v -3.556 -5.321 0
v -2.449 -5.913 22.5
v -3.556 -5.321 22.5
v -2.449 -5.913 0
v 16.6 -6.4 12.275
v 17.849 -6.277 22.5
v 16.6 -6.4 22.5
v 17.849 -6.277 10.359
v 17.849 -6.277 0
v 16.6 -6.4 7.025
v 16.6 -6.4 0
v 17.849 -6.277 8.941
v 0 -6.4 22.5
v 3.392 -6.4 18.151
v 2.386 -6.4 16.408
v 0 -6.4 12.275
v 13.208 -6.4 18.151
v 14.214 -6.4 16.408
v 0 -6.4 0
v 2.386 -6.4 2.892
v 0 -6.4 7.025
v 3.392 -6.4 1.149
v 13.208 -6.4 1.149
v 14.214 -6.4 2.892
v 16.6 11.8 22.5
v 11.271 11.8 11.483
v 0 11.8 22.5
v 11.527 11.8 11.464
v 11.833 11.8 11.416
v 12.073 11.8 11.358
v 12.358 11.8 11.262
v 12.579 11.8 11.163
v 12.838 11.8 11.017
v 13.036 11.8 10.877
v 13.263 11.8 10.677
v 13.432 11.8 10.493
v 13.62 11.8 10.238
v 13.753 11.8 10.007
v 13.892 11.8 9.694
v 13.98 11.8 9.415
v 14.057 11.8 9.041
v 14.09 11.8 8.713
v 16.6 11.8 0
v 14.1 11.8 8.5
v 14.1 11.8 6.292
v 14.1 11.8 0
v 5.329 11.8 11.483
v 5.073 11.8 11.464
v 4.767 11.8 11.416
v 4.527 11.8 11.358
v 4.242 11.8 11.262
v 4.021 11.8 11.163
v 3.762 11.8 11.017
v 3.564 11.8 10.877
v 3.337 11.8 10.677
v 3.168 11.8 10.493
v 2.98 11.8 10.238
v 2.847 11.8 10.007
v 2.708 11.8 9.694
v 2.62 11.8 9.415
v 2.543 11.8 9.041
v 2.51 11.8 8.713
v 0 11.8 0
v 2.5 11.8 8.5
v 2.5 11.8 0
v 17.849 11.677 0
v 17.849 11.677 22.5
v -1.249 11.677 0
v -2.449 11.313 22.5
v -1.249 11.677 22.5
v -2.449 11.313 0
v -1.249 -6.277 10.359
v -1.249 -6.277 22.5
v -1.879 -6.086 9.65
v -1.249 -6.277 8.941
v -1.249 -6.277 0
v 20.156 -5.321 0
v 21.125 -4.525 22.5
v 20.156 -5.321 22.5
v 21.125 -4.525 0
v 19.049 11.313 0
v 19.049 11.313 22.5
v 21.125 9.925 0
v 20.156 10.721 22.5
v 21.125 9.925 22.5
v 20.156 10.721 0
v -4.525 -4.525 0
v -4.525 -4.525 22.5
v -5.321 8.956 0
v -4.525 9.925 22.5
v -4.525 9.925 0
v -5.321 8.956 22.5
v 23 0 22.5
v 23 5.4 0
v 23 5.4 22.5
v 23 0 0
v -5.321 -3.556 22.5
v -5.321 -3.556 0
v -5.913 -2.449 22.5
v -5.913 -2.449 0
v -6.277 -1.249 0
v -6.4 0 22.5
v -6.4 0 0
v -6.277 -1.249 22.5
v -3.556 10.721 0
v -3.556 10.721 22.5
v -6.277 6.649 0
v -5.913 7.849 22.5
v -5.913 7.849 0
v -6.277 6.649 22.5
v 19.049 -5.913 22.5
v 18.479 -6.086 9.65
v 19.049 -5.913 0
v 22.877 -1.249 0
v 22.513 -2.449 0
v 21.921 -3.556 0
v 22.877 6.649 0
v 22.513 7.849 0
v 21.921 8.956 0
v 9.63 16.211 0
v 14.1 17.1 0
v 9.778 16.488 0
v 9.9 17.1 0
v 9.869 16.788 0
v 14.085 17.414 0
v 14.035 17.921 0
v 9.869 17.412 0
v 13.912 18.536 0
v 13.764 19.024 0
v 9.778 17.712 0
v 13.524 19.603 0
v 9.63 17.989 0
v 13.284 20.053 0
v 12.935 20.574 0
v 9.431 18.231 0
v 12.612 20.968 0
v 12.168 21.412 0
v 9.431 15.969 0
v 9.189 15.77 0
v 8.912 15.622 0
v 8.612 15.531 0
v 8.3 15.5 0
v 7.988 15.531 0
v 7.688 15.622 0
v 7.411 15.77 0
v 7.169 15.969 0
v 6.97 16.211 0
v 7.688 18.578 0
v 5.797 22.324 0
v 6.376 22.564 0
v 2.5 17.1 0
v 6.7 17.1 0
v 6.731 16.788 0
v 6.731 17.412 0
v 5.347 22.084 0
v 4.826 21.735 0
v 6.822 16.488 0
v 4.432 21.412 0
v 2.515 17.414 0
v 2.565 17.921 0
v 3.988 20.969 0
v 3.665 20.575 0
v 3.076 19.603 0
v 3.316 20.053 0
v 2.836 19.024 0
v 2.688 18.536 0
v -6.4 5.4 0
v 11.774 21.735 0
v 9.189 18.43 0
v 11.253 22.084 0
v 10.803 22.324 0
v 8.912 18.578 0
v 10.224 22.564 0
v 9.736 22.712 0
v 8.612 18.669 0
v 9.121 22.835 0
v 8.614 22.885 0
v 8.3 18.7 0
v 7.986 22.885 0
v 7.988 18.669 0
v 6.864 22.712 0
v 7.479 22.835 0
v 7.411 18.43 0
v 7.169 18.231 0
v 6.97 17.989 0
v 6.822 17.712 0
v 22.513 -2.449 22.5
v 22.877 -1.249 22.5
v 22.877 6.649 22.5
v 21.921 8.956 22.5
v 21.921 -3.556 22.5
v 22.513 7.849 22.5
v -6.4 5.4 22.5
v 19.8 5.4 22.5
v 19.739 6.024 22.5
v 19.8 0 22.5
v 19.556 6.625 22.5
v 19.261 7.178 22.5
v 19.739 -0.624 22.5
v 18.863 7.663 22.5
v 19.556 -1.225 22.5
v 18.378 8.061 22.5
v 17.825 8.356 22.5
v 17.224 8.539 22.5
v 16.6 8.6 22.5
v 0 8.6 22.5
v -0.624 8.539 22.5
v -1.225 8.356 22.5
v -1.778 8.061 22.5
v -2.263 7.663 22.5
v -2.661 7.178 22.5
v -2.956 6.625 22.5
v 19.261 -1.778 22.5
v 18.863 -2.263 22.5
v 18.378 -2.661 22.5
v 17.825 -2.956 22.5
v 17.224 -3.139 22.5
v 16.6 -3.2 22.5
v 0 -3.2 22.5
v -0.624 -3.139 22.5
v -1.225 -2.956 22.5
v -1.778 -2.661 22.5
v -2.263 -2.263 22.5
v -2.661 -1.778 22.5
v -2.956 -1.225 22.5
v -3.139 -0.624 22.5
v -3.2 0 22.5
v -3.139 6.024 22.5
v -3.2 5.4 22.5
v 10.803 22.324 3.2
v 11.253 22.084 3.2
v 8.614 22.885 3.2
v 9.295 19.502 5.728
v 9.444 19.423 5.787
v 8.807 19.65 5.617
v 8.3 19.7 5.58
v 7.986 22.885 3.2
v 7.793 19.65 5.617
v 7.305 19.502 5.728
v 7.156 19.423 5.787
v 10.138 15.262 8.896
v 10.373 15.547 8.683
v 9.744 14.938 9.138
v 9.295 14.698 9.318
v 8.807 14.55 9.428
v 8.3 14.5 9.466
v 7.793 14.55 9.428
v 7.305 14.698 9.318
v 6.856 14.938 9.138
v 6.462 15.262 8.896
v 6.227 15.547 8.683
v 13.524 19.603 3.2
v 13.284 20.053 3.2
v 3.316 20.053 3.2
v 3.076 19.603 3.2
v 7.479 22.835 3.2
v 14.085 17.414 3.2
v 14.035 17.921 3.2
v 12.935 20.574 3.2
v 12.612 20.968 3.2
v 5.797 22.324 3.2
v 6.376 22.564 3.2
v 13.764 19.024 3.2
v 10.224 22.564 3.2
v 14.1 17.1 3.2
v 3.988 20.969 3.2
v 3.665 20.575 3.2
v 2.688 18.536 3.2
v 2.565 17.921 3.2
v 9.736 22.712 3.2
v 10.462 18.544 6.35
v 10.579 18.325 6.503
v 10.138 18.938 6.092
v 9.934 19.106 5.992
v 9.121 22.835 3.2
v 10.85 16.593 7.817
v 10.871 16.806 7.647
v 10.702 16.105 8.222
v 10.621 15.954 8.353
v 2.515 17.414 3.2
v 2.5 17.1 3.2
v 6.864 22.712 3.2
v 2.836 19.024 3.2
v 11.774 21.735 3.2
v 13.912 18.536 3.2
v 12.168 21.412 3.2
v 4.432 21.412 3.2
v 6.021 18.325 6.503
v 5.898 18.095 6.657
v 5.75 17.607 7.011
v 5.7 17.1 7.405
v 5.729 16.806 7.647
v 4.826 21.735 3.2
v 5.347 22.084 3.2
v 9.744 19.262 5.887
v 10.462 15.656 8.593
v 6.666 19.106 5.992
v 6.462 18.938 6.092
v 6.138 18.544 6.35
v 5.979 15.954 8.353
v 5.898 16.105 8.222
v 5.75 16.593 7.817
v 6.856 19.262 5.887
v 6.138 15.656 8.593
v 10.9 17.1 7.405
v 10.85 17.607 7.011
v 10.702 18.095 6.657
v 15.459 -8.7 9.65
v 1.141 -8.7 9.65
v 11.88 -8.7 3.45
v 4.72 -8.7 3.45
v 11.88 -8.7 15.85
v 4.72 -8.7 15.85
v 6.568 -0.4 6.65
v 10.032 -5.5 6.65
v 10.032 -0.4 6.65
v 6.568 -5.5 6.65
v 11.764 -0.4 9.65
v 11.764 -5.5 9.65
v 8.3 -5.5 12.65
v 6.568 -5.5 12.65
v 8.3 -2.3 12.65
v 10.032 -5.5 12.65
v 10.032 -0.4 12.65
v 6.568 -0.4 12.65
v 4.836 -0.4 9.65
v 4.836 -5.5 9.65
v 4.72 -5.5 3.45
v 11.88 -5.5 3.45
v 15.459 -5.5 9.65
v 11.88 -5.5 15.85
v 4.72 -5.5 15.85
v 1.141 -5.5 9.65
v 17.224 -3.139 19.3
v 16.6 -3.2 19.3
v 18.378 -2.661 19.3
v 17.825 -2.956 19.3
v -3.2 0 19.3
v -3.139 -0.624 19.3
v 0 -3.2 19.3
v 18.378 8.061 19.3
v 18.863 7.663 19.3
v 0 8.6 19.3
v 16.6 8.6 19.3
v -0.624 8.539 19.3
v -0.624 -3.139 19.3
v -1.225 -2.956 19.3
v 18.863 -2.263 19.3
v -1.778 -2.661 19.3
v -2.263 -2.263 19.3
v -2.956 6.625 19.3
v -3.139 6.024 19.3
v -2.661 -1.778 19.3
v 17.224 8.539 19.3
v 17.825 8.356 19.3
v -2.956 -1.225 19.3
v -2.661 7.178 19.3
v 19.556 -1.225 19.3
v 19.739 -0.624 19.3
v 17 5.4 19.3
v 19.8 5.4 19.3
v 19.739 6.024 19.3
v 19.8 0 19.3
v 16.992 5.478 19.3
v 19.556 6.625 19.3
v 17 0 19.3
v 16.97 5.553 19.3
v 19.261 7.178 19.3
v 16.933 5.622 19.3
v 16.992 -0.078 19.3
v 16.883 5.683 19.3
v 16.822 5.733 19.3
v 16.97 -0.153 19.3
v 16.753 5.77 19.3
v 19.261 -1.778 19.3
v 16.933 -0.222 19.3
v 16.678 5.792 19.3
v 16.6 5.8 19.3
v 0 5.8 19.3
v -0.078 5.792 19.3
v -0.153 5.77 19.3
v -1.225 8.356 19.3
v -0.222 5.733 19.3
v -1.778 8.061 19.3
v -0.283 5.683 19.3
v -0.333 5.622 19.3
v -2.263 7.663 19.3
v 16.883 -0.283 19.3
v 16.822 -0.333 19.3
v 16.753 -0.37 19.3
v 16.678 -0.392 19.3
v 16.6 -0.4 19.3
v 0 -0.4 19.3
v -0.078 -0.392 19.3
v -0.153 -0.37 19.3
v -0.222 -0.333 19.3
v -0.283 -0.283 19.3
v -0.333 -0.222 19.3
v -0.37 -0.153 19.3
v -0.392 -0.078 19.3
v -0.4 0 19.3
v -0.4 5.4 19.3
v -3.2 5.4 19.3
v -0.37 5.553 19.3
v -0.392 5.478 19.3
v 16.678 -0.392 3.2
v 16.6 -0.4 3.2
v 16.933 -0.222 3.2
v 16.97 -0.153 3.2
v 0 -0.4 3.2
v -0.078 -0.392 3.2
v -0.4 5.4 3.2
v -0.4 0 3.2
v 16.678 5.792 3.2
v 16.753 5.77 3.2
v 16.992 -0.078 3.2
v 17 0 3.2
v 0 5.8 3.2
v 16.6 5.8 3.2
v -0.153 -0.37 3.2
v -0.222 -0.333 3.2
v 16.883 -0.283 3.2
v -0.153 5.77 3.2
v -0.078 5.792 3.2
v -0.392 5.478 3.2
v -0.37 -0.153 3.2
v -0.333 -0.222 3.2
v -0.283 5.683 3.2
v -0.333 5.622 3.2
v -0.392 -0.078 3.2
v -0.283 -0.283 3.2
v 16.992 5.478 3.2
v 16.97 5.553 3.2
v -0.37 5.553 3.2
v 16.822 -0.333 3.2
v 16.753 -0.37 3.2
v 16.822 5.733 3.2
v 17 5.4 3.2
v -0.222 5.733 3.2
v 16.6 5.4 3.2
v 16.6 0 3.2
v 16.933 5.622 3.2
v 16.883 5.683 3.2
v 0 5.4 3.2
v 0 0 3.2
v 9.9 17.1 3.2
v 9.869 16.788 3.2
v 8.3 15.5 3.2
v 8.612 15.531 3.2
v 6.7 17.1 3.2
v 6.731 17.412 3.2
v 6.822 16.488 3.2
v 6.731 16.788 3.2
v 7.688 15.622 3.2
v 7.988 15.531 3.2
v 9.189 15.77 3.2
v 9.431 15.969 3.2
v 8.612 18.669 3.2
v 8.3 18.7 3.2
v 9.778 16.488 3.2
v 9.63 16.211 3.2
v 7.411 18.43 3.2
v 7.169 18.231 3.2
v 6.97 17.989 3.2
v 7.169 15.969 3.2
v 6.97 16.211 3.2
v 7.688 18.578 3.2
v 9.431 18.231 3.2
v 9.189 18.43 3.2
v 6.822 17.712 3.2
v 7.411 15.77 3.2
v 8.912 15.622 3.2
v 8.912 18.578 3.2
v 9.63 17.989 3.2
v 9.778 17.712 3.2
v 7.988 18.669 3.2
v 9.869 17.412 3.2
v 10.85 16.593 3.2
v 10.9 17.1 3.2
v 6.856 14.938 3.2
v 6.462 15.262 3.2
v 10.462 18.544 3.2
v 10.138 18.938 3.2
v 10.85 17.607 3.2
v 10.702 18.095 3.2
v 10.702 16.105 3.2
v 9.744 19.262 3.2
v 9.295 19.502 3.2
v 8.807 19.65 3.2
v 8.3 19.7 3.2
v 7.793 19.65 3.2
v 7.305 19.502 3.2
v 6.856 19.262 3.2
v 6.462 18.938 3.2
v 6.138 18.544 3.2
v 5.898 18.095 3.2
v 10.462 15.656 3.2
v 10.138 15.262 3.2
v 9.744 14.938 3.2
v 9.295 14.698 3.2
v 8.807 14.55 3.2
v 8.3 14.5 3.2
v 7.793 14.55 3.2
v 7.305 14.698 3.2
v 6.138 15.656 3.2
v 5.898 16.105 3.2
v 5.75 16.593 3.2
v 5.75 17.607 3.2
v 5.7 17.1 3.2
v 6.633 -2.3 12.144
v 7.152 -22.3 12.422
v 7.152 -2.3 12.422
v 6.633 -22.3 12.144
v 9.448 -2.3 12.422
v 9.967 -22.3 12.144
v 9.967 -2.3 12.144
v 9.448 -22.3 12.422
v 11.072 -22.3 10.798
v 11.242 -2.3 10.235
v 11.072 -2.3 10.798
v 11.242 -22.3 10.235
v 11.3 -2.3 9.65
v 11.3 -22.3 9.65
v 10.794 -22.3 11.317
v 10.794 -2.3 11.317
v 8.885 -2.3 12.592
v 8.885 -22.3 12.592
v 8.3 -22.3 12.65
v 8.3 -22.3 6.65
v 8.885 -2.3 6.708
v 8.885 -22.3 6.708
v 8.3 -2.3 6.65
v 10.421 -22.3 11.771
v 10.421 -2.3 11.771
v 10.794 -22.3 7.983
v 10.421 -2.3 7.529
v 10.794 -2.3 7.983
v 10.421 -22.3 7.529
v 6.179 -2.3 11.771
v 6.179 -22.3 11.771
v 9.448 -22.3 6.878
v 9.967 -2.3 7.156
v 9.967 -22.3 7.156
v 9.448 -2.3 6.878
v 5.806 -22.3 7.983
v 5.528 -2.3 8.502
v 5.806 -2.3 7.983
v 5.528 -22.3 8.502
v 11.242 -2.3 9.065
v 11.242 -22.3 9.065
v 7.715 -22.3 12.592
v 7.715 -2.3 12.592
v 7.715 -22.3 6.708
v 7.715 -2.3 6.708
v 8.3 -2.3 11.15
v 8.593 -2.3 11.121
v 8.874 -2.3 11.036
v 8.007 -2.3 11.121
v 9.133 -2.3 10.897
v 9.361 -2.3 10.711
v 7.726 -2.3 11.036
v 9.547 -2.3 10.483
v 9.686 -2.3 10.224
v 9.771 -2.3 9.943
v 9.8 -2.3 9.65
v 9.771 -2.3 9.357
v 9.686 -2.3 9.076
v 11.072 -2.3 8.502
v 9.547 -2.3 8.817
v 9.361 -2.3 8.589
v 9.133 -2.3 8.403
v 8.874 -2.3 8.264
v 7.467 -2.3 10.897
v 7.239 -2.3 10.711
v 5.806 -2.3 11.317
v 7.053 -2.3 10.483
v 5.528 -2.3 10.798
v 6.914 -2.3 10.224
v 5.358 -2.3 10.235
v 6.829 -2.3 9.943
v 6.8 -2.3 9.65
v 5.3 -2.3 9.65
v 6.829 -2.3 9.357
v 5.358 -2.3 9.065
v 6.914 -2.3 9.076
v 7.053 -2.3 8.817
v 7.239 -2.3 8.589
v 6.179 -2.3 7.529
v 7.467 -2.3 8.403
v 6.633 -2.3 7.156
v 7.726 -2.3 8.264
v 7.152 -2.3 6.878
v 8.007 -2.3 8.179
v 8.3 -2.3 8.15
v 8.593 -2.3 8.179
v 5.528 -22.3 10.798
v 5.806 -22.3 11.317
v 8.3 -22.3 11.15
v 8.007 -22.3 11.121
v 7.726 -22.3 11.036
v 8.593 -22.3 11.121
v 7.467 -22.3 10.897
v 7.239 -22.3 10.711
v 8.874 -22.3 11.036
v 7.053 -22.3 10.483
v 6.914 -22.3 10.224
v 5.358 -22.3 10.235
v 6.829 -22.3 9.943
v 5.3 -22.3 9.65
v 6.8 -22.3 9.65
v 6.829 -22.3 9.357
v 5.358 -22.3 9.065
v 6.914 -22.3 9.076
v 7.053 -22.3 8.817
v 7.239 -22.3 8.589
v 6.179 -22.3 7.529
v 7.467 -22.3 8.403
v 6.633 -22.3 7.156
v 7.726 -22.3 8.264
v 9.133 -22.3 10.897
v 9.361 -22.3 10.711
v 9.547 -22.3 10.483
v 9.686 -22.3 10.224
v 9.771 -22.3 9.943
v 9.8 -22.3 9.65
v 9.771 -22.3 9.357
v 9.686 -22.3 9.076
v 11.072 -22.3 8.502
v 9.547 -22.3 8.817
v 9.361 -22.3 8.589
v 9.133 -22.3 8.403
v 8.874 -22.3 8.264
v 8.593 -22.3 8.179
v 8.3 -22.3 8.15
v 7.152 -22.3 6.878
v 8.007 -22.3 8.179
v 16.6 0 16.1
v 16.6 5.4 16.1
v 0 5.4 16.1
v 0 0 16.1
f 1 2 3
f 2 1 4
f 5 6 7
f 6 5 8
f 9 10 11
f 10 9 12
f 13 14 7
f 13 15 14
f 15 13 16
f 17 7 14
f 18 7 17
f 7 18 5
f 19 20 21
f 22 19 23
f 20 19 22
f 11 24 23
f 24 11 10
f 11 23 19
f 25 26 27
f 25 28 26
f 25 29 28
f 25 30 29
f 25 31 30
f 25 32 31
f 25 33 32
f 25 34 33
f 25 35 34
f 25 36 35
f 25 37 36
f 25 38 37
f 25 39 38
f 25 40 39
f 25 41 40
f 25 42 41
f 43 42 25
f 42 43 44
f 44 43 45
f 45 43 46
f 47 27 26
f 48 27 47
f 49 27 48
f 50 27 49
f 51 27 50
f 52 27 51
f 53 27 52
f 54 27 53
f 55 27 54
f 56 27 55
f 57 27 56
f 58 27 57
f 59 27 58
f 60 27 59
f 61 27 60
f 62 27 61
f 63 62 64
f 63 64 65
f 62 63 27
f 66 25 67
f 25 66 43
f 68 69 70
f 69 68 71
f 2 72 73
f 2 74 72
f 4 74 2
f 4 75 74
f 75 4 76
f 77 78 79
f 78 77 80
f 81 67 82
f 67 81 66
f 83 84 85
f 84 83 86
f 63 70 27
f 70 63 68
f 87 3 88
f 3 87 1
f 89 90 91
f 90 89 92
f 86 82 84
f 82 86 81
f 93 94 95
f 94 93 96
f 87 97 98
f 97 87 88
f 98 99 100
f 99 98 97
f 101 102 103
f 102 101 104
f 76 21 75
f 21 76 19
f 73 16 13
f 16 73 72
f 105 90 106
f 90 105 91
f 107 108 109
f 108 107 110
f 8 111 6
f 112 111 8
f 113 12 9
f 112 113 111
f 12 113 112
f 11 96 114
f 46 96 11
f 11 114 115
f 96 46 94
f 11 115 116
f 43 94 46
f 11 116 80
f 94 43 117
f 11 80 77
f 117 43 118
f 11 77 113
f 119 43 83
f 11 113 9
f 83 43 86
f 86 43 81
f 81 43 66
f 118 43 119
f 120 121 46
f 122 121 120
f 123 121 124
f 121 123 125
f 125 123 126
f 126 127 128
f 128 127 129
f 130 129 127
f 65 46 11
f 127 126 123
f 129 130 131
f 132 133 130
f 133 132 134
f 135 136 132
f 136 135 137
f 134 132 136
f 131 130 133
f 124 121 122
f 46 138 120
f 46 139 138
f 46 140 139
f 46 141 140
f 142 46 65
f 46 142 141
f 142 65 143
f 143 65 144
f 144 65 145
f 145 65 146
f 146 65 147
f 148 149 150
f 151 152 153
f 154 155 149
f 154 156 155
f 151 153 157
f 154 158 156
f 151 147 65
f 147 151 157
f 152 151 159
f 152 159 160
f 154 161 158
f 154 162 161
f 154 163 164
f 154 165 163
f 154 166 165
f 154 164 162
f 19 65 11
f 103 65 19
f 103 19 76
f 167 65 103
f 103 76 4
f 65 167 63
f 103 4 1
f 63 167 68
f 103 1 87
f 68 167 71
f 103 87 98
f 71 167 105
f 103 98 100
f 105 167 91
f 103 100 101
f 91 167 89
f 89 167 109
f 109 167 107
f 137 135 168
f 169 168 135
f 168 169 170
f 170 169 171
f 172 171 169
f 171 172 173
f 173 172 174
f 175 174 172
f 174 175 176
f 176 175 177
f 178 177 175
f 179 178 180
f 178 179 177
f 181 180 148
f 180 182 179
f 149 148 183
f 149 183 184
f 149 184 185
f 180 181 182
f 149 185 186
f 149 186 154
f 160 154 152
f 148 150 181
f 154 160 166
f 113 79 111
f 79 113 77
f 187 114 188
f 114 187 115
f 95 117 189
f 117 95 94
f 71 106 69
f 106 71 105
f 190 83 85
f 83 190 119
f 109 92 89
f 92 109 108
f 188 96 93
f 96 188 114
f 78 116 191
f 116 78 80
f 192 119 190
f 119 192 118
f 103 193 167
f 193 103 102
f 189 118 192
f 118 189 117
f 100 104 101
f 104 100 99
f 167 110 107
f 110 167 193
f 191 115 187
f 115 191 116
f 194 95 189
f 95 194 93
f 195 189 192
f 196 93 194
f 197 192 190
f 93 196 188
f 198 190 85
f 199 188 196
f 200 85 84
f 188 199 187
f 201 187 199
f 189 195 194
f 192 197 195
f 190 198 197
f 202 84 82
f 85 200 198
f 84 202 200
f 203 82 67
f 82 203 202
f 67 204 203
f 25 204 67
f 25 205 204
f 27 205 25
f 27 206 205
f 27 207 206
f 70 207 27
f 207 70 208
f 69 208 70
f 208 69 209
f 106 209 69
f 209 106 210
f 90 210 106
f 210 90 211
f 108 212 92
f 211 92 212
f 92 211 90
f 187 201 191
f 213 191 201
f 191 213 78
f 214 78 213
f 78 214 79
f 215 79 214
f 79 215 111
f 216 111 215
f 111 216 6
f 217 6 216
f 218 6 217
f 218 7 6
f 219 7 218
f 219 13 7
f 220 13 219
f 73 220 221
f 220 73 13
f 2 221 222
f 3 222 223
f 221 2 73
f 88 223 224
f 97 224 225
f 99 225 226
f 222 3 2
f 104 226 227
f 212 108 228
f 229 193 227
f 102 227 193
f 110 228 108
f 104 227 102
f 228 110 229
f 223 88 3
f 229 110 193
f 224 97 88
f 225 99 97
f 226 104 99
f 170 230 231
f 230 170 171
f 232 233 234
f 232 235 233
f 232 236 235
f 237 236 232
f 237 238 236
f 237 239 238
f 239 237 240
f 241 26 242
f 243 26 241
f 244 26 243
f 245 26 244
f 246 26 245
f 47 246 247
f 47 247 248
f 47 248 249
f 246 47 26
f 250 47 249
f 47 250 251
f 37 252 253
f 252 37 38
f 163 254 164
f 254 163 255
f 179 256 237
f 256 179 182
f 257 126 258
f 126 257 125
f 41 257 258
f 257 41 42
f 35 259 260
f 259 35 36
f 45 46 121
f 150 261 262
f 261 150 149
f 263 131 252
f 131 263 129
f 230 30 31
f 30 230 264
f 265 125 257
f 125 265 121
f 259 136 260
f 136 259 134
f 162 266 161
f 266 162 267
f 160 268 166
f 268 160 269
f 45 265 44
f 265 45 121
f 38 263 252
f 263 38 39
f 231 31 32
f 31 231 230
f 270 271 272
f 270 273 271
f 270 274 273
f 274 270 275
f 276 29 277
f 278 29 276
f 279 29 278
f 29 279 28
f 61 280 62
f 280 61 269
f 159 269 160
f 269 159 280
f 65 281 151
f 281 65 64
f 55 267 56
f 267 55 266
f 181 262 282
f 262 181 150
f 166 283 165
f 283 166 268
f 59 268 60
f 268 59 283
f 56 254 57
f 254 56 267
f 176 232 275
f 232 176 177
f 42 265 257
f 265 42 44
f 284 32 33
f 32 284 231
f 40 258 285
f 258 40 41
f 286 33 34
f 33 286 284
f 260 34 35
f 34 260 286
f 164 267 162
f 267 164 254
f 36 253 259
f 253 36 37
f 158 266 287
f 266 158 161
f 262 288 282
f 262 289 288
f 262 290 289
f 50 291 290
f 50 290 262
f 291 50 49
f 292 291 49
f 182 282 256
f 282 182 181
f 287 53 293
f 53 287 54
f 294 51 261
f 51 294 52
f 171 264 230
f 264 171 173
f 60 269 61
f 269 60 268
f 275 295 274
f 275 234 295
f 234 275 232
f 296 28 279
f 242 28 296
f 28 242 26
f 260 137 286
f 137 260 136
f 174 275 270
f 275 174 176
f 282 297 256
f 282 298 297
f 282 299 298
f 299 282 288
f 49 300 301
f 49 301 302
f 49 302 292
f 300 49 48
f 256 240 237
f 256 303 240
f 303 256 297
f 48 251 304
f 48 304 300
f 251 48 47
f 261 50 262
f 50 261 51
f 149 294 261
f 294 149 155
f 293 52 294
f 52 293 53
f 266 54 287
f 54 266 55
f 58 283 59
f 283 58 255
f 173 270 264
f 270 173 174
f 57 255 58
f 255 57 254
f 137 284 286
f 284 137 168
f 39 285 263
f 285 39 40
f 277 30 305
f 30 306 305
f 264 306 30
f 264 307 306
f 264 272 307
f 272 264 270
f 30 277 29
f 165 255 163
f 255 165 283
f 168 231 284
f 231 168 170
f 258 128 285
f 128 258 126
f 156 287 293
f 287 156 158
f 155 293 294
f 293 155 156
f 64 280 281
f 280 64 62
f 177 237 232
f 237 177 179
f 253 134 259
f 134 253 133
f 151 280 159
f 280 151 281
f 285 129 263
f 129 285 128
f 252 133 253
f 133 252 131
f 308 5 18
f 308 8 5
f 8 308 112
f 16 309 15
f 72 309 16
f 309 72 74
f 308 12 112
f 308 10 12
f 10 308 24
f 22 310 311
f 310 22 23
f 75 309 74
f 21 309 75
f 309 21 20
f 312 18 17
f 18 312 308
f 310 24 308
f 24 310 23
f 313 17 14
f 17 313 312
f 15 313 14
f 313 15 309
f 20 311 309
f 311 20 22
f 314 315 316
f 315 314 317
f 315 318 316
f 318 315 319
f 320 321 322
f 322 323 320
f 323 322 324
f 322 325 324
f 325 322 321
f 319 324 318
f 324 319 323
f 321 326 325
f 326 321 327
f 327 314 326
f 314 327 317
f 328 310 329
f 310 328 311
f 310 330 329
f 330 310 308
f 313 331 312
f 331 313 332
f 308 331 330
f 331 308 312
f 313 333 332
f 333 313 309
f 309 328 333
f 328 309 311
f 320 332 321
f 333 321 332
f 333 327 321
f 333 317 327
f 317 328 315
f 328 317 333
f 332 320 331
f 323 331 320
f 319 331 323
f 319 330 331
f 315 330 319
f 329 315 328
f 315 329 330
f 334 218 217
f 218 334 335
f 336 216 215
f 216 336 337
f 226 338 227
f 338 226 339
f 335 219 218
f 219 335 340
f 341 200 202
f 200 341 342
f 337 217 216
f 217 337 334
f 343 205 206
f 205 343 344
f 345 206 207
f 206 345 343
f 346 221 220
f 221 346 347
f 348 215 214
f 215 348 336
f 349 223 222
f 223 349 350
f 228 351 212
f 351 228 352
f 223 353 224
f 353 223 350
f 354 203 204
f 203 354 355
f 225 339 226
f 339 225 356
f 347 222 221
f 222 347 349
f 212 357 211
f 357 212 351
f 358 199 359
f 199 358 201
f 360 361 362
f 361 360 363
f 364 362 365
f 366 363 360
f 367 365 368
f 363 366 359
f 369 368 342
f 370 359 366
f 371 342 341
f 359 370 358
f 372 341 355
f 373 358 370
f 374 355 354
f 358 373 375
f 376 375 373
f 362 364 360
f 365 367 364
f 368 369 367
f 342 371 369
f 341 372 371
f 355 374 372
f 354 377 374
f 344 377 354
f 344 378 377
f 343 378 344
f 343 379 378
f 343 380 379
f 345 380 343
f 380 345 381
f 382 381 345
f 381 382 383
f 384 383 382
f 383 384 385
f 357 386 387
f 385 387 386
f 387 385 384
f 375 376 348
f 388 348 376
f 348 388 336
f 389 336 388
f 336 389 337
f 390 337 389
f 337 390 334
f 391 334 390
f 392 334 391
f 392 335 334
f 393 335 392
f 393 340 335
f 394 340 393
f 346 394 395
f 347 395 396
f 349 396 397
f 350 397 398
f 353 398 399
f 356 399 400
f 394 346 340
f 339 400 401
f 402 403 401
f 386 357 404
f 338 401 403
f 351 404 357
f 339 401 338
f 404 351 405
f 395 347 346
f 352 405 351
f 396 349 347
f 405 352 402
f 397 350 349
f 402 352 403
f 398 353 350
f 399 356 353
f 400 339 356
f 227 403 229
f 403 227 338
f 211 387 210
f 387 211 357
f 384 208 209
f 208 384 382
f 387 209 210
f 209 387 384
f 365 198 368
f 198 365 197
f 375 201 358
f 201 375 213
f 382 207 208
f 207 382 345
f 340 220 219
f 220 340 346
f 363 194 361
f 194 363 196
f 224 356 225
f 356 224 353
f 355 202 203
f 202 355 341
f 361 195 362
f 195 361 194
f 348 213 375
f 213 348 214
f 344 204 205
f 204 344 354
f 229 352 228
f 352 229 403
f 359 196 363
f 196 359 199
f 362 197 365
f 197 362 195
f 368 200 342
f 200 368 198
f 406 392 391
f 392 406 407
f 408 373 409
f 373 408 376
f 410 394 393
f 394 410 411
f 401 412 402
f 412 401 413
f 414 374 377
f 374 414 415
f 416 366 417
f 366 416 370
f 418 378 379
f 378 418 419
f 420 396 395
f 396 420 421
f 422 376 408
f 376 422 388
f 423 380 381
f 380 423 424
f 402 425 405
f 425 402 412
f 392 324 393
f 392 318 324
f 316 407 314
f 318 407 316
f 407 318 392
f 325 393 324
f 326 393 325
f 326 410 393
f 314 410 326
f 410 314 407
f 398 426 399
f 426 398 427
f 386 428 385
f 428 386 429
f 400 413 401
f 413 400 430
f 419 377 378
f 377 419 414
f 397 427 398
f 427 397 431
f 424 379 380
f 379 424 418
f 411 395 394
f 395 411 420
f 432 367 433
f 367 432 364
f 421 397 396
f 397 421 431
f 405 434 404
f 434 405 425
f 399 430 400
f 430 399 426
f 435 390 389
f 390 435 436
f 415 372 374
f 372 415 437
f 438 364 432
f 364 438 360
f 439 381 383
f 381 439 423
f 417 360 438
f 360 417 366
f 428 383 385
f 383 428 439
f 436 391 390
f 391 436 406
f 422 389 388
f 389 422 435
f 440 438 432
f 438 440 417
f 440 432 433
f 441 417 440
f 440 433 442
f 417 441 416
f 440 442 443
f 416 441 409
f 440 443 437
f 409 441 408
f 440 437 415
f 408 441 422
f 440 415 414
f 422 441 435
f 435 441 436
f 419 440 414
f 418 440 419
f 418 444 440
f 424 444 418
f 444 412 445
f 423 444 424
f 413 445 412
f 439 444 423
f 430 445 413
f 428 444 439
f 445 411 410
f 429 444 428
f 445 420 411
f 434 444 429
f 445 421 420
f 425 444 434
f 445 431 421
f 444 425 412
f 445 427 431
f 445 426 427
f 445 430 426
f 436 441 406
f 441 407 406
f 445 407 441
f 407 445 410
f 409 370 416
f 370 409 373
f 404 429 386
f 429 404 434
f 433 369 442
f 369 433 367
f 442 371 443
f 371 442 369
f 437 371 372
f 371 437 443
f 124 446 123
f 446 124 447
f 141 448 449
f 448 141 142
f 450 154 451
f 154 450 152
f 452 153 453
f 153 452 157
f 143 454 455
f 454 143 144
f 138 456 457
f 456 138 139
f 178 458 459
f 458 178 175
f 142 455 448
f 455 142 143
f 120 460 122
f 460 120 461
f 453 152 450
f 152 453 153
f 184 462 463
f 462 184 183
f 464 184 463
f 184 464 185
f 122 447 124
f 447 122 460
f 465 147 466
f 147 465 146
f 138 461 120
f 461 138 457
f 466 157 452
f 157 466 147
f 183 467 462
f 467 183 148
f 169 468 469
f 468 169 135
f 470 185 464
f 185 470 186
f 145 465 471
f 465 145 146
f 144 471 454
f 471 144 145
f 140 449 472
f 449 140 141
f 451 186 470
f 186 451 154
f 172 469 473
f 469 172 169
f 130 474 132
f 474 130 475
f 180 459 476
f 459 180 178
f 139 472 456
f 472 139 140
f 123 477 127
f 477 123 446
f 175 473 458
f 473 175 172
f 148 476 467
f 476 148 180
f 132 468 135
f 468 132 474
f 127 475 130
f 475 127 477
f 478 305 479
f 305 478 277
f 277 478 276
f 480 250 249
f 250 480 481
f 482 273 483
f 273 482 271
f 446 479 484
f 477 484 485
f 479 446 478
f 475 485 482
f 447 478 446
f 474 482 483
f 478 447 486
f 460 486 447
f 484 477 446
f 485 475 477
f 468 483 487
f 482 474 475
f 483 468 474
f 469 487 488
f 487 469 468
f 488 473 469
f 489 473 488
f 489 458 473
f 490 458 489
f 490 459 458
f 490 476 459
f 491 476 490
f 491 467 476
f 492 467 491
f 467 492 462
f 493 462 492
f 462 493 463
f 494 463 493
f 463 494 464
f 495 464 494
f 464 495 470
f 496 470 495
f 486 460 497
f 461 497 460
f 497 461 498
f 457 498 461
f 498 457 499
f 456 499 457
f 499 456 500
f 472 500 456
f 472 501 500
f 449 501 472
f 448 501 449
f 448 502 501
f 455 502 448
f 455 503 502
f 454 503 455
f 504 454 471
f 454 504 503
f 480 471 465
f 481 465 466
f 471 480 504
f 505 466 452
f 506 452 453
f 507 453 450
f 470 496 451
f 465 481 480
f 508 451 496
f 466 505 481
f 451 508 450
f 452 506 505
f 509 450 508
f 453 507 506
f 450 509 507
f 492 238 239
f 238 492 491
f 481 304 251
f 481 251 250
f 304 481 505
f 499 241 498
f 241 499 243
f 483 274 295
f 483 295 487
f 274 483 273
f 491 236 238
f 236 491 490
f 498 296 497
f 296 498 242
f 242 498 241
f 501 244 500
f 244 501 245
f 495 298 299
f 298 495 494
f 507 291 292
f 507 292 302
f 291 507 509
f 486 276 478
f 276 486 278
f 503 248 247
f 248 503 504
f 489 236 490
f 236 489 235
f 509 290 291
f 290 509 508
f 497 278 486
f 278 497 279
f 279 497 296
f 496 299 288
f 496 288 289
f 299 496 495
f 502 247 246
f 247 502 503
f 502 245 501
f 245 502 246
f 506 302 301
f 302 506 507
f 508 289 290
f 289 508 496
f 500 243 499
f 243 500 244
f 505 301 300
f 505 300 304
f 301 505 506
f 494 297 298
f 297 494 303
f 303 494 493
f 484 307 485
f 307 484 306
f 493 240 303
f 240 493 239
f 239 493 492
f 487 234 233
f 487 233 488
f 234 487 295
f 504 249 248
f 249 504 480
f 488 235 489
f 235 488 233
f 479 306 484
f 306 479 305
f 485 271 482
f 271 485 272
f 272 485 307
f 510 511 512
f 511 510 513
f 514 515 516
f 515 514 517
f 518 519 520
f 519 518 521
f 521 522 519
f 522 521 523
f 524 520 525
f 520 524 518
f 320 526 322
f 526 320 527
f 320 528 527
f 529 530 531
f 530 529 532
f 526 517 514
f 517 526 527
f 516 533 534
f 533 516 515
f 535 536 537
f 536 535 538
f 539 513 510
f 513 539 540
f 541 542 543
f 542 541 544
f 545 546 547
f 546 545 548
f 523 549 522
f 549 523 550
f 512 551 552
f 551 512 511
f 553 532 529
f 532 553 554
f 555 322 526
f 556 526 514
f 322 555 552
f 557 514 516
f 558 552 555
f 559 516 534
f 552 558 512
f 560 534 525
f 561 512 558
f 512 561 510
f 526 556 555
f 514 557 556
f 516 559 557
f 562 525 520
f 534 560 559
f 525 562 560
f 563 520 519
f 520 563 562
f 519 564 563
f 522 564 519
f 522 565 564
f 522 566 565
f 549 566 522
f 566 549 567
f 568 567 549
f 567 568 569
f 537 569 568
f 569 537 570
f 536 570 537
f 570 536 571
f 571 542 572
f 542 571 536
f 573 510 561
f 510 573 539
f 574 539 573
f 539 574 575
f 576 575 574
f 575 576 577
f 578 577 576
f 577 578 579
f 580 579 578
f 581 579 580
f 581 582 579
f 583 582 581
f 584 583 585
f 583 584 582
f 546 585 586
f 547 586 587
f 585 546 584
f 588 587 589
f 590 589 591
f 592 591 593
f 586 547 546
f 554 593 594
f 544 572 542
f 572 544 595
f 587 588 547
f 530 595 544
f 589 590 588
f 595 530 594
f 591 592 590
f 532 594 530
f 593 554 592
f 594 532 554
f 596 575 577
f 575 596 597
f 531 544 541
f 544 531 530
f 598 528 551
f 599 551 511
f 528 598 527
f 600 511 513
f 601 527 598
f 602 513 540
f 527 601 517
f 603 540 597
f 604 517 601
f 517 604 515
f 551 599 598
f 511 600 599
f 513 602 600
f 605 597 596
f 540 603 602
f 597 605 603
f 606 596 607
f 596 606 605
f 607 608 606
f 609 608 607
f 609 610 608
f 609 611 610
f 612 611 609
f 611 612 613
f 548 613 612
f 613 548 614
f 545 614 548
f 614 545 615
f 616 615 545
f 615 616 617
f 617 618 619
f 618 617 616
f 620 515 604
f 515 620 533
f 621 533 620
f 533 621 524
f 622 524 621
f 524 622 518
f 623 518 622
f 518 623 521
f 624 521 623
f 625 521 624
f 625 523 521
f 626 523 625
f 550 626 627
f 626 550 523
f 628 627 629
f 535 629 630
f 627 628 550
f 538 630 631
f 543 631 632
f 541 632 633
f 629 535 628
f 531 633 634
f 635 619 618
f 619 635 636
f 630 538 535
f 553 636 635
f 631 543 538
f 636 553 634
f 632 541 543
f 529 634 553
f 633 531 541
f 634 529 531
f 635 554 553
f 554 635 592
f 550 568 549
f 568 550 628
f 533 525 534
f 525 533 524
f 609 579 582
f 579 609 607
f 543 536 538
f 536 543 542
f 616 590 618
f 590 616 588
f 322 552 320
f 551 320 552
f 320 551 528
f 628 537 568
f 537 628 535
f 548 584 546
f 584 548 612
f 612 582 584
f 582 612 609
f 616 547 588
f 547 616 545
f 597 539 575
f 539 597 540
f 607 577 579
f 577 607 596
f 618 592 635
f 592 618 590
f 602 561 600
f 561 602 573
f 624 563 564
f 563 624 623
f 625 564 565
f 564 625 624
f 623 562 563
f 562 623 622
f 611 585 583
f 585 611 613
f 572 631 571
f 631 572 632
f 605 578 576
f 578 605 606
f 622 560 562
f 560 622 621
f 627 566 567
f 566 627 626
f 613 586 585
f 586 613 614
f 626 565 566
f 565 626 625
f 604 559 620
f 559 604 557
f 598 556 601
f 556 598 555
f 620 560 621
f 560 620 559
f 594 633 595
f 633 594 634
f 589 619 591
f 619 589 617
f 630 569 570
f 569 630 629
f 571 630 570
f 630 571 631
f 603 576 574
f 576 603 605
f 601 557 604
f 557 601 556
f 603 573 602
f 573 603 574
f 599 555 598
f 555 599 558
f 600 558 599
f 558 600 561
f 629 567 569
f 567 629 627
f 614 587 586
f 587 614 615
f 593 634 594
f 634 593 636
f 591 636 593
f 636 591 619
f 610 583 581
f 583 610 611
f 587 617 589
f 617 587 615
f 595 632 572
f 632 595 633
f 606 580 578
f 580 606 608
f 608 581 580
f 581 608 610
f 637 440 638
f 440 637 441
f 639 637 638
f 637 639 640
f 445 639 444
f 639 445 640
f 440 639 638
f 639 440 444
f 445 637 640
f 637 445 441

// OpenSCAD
// file: util.scad
/* circumscribed (outer) polygons, polygonal cylinders, and cones */

module cylinder_outer(h = 0, r = 0, d = 0, fn = $fn) {
   fudge = 1/cos(180/fn);
   if (r == 0) cylinder(h=h, d=d*fudge, $fn=fn);
   else cylinder(h=h, r=r*fudge, $fn=fn);
}

module cone_outer(h = 0, r1 = 0, r2 = 0, d1 = 0, d2 = 0, fn = $fn) {
   fudge = 1/cos(180/fn);
   if ((r1 == 0) && (r2 == 0)) cylinder(h=h, d1=d1*fudge, d2=d2*fudge, $fn=fn);
   else cylinder(h=h, r1=r1*fudge, r2=r2*fudge, $fn=fn);
}

module circle_outer(d = 0, r = 0, fn = $fn) {
    fudge = 1/cos(180/fn);
    if (r == 0) circle(d = d*fudge, $fn=fn);
    else circle(r = r*fudge, $fn=fn);
}

/* create two (washers, screws, standoffs) separated by a distance */

module twice() {
    translate([0, stepper_screw_spacing/2, 0])
    children();
    translate([0, -stepper_screw_spacing/2, 0])
    children();
}

/* make cutout */

module cutout(cut = true) {
    if (cut) 
        difference() {
            children();
            translate([0, 0, -100])
            cube([200, 200, 200]);
        }
    else
        children();
}

/* not truncated */
// main file
/*
 * box for BME280 vacuum sensor modules, pcb size 16x12 mm.
 *
 * Slide the sensor module in at the top of the box, pressure sensor
 * facing the hole in the front of the box, connecting cable up.  
 * Put 6mm diameter pneumatic tubing in the hole in the front of the box.
 * Seal top and front with melt glue. 
 */
include <util.scad> 
 
eps1 = 0.001;
eps2 = 2*eps1;
$fn=32;
nozzle_size = 0.4;
wall = 3.2;

pcb_x = 15.8+2*nozzle_size;
pcb_z = 12.5+nozzle_size;
pcb_y = 5.0+nozzle_size;

box_z = pcb_z+3*wall;

tube_dia = 6.0;
tube_x = pcb_x/2;
tube_y = -pcb_y/2-wall+nozzle_size;
tube_z = pcb_z/2+wall;
 
screw_hole = 3.2;
screw_offset = pcb_y/2 + 4*wall + screw_hole/2;
washer_dia = 5.2;
 
module box() {
    difference() {
        box_body();
        box_holes();
    }
}

module box_body() {

    linear_extrude(box_z)
    offset(2*wall)
    square([pcb_x, pcb_y]);
    
    /* tab for screw */
    hull() {
        translate([pcb_x/2, 0, screw_offset+wall])
        cube([washer_dia+2*wall, eps1, eps1], center=true);
        linear_extrude(wall)
        offset(wall)
        hull() {
            translate([pcb_x/2, 0, 0])
            square([washer_dia, eps1], center=true);
            translate([pcb_x/2,screw_offset, 0])
            circle(d=washer_dia);
        }
    }
    
    /* tube */
    tube_body();
    
}

module box_holes() {
    translate([0,0,wall+pcb_z+wall])
    linear_extrude(pcb_z+2*wall)
    offset(wall)
    square([pcb_x, pcb_y]);   
    
    translate([0,0,wall])
    linear_extrude(pcb_z+2*wall)
    offset(nozzle_size)
    square([pcb_x, pcb_y]);
    
    translate([pcb_x/2,screw_offset, -pcb_z])
    linear_extrude(2*pcb_z)
    circle(d=screw_hole);
    
    translate([pcb_x/2,screw_offset, wall])
    linear_extrude(2*pcb_z)
    circle(d=washer_dia);
    
    tube_hole();

}

module tube_body() {
    translate([tube_x,tube_y,tube_z])
    rotate([90,0,0])
    hull() {
        cylinder_outer(d=tube_dia+2*wall, h=wall, fn=6);
        cylinder_outer(d=tube_dia+4*wall, h=eps1, fn=6);
    }
}

module tube_hole() {
    translate([tube_x,0,tube_z])
    rotate([90,0,0])
    cylinder_outer(d=tube_dia, h=100, fn=6);
    translate([tube_x,tube_y,tube_z])
    rotate([90,0,0])
    cylinder_outer(d=tube_dia+2*wall, h=100, fn=6);
}

module lid() {
    cable_width = 1.27*6;
    cable_thickness = 1.27;
    translate([0,0,0])
    linear_extrude(wall/2)
    difference() {
        offset(wall-2*nozzle_size)
        square([pcb_x, pcb_y]);
        translate([0, pcb_y/2])
        square([pcb_x + cable_width, cable_thickness], center=true);
    }
}

module assembly() {
    box();
    /* tube */
    color("Blue")
    translate([tube_x,tube_y+wall,tube_z])
    rotate([90,0,0])
    difference() {
        cylinder(d = tube_dia, h =20);
        translate([0,0,-eps2])
        cylinder(d = tube_dia/2, h =40);
    }
    /* pcb */
    color("Purple")
    translate([0,0,wall])
    cube([pcb_x, pcb_y, pcb_z]);
    /* lid */
    if (0)
    translate([0,0,wall+pcb_z+wall+eps1])
    lid();
}

assembly();
//box();
//lid();
